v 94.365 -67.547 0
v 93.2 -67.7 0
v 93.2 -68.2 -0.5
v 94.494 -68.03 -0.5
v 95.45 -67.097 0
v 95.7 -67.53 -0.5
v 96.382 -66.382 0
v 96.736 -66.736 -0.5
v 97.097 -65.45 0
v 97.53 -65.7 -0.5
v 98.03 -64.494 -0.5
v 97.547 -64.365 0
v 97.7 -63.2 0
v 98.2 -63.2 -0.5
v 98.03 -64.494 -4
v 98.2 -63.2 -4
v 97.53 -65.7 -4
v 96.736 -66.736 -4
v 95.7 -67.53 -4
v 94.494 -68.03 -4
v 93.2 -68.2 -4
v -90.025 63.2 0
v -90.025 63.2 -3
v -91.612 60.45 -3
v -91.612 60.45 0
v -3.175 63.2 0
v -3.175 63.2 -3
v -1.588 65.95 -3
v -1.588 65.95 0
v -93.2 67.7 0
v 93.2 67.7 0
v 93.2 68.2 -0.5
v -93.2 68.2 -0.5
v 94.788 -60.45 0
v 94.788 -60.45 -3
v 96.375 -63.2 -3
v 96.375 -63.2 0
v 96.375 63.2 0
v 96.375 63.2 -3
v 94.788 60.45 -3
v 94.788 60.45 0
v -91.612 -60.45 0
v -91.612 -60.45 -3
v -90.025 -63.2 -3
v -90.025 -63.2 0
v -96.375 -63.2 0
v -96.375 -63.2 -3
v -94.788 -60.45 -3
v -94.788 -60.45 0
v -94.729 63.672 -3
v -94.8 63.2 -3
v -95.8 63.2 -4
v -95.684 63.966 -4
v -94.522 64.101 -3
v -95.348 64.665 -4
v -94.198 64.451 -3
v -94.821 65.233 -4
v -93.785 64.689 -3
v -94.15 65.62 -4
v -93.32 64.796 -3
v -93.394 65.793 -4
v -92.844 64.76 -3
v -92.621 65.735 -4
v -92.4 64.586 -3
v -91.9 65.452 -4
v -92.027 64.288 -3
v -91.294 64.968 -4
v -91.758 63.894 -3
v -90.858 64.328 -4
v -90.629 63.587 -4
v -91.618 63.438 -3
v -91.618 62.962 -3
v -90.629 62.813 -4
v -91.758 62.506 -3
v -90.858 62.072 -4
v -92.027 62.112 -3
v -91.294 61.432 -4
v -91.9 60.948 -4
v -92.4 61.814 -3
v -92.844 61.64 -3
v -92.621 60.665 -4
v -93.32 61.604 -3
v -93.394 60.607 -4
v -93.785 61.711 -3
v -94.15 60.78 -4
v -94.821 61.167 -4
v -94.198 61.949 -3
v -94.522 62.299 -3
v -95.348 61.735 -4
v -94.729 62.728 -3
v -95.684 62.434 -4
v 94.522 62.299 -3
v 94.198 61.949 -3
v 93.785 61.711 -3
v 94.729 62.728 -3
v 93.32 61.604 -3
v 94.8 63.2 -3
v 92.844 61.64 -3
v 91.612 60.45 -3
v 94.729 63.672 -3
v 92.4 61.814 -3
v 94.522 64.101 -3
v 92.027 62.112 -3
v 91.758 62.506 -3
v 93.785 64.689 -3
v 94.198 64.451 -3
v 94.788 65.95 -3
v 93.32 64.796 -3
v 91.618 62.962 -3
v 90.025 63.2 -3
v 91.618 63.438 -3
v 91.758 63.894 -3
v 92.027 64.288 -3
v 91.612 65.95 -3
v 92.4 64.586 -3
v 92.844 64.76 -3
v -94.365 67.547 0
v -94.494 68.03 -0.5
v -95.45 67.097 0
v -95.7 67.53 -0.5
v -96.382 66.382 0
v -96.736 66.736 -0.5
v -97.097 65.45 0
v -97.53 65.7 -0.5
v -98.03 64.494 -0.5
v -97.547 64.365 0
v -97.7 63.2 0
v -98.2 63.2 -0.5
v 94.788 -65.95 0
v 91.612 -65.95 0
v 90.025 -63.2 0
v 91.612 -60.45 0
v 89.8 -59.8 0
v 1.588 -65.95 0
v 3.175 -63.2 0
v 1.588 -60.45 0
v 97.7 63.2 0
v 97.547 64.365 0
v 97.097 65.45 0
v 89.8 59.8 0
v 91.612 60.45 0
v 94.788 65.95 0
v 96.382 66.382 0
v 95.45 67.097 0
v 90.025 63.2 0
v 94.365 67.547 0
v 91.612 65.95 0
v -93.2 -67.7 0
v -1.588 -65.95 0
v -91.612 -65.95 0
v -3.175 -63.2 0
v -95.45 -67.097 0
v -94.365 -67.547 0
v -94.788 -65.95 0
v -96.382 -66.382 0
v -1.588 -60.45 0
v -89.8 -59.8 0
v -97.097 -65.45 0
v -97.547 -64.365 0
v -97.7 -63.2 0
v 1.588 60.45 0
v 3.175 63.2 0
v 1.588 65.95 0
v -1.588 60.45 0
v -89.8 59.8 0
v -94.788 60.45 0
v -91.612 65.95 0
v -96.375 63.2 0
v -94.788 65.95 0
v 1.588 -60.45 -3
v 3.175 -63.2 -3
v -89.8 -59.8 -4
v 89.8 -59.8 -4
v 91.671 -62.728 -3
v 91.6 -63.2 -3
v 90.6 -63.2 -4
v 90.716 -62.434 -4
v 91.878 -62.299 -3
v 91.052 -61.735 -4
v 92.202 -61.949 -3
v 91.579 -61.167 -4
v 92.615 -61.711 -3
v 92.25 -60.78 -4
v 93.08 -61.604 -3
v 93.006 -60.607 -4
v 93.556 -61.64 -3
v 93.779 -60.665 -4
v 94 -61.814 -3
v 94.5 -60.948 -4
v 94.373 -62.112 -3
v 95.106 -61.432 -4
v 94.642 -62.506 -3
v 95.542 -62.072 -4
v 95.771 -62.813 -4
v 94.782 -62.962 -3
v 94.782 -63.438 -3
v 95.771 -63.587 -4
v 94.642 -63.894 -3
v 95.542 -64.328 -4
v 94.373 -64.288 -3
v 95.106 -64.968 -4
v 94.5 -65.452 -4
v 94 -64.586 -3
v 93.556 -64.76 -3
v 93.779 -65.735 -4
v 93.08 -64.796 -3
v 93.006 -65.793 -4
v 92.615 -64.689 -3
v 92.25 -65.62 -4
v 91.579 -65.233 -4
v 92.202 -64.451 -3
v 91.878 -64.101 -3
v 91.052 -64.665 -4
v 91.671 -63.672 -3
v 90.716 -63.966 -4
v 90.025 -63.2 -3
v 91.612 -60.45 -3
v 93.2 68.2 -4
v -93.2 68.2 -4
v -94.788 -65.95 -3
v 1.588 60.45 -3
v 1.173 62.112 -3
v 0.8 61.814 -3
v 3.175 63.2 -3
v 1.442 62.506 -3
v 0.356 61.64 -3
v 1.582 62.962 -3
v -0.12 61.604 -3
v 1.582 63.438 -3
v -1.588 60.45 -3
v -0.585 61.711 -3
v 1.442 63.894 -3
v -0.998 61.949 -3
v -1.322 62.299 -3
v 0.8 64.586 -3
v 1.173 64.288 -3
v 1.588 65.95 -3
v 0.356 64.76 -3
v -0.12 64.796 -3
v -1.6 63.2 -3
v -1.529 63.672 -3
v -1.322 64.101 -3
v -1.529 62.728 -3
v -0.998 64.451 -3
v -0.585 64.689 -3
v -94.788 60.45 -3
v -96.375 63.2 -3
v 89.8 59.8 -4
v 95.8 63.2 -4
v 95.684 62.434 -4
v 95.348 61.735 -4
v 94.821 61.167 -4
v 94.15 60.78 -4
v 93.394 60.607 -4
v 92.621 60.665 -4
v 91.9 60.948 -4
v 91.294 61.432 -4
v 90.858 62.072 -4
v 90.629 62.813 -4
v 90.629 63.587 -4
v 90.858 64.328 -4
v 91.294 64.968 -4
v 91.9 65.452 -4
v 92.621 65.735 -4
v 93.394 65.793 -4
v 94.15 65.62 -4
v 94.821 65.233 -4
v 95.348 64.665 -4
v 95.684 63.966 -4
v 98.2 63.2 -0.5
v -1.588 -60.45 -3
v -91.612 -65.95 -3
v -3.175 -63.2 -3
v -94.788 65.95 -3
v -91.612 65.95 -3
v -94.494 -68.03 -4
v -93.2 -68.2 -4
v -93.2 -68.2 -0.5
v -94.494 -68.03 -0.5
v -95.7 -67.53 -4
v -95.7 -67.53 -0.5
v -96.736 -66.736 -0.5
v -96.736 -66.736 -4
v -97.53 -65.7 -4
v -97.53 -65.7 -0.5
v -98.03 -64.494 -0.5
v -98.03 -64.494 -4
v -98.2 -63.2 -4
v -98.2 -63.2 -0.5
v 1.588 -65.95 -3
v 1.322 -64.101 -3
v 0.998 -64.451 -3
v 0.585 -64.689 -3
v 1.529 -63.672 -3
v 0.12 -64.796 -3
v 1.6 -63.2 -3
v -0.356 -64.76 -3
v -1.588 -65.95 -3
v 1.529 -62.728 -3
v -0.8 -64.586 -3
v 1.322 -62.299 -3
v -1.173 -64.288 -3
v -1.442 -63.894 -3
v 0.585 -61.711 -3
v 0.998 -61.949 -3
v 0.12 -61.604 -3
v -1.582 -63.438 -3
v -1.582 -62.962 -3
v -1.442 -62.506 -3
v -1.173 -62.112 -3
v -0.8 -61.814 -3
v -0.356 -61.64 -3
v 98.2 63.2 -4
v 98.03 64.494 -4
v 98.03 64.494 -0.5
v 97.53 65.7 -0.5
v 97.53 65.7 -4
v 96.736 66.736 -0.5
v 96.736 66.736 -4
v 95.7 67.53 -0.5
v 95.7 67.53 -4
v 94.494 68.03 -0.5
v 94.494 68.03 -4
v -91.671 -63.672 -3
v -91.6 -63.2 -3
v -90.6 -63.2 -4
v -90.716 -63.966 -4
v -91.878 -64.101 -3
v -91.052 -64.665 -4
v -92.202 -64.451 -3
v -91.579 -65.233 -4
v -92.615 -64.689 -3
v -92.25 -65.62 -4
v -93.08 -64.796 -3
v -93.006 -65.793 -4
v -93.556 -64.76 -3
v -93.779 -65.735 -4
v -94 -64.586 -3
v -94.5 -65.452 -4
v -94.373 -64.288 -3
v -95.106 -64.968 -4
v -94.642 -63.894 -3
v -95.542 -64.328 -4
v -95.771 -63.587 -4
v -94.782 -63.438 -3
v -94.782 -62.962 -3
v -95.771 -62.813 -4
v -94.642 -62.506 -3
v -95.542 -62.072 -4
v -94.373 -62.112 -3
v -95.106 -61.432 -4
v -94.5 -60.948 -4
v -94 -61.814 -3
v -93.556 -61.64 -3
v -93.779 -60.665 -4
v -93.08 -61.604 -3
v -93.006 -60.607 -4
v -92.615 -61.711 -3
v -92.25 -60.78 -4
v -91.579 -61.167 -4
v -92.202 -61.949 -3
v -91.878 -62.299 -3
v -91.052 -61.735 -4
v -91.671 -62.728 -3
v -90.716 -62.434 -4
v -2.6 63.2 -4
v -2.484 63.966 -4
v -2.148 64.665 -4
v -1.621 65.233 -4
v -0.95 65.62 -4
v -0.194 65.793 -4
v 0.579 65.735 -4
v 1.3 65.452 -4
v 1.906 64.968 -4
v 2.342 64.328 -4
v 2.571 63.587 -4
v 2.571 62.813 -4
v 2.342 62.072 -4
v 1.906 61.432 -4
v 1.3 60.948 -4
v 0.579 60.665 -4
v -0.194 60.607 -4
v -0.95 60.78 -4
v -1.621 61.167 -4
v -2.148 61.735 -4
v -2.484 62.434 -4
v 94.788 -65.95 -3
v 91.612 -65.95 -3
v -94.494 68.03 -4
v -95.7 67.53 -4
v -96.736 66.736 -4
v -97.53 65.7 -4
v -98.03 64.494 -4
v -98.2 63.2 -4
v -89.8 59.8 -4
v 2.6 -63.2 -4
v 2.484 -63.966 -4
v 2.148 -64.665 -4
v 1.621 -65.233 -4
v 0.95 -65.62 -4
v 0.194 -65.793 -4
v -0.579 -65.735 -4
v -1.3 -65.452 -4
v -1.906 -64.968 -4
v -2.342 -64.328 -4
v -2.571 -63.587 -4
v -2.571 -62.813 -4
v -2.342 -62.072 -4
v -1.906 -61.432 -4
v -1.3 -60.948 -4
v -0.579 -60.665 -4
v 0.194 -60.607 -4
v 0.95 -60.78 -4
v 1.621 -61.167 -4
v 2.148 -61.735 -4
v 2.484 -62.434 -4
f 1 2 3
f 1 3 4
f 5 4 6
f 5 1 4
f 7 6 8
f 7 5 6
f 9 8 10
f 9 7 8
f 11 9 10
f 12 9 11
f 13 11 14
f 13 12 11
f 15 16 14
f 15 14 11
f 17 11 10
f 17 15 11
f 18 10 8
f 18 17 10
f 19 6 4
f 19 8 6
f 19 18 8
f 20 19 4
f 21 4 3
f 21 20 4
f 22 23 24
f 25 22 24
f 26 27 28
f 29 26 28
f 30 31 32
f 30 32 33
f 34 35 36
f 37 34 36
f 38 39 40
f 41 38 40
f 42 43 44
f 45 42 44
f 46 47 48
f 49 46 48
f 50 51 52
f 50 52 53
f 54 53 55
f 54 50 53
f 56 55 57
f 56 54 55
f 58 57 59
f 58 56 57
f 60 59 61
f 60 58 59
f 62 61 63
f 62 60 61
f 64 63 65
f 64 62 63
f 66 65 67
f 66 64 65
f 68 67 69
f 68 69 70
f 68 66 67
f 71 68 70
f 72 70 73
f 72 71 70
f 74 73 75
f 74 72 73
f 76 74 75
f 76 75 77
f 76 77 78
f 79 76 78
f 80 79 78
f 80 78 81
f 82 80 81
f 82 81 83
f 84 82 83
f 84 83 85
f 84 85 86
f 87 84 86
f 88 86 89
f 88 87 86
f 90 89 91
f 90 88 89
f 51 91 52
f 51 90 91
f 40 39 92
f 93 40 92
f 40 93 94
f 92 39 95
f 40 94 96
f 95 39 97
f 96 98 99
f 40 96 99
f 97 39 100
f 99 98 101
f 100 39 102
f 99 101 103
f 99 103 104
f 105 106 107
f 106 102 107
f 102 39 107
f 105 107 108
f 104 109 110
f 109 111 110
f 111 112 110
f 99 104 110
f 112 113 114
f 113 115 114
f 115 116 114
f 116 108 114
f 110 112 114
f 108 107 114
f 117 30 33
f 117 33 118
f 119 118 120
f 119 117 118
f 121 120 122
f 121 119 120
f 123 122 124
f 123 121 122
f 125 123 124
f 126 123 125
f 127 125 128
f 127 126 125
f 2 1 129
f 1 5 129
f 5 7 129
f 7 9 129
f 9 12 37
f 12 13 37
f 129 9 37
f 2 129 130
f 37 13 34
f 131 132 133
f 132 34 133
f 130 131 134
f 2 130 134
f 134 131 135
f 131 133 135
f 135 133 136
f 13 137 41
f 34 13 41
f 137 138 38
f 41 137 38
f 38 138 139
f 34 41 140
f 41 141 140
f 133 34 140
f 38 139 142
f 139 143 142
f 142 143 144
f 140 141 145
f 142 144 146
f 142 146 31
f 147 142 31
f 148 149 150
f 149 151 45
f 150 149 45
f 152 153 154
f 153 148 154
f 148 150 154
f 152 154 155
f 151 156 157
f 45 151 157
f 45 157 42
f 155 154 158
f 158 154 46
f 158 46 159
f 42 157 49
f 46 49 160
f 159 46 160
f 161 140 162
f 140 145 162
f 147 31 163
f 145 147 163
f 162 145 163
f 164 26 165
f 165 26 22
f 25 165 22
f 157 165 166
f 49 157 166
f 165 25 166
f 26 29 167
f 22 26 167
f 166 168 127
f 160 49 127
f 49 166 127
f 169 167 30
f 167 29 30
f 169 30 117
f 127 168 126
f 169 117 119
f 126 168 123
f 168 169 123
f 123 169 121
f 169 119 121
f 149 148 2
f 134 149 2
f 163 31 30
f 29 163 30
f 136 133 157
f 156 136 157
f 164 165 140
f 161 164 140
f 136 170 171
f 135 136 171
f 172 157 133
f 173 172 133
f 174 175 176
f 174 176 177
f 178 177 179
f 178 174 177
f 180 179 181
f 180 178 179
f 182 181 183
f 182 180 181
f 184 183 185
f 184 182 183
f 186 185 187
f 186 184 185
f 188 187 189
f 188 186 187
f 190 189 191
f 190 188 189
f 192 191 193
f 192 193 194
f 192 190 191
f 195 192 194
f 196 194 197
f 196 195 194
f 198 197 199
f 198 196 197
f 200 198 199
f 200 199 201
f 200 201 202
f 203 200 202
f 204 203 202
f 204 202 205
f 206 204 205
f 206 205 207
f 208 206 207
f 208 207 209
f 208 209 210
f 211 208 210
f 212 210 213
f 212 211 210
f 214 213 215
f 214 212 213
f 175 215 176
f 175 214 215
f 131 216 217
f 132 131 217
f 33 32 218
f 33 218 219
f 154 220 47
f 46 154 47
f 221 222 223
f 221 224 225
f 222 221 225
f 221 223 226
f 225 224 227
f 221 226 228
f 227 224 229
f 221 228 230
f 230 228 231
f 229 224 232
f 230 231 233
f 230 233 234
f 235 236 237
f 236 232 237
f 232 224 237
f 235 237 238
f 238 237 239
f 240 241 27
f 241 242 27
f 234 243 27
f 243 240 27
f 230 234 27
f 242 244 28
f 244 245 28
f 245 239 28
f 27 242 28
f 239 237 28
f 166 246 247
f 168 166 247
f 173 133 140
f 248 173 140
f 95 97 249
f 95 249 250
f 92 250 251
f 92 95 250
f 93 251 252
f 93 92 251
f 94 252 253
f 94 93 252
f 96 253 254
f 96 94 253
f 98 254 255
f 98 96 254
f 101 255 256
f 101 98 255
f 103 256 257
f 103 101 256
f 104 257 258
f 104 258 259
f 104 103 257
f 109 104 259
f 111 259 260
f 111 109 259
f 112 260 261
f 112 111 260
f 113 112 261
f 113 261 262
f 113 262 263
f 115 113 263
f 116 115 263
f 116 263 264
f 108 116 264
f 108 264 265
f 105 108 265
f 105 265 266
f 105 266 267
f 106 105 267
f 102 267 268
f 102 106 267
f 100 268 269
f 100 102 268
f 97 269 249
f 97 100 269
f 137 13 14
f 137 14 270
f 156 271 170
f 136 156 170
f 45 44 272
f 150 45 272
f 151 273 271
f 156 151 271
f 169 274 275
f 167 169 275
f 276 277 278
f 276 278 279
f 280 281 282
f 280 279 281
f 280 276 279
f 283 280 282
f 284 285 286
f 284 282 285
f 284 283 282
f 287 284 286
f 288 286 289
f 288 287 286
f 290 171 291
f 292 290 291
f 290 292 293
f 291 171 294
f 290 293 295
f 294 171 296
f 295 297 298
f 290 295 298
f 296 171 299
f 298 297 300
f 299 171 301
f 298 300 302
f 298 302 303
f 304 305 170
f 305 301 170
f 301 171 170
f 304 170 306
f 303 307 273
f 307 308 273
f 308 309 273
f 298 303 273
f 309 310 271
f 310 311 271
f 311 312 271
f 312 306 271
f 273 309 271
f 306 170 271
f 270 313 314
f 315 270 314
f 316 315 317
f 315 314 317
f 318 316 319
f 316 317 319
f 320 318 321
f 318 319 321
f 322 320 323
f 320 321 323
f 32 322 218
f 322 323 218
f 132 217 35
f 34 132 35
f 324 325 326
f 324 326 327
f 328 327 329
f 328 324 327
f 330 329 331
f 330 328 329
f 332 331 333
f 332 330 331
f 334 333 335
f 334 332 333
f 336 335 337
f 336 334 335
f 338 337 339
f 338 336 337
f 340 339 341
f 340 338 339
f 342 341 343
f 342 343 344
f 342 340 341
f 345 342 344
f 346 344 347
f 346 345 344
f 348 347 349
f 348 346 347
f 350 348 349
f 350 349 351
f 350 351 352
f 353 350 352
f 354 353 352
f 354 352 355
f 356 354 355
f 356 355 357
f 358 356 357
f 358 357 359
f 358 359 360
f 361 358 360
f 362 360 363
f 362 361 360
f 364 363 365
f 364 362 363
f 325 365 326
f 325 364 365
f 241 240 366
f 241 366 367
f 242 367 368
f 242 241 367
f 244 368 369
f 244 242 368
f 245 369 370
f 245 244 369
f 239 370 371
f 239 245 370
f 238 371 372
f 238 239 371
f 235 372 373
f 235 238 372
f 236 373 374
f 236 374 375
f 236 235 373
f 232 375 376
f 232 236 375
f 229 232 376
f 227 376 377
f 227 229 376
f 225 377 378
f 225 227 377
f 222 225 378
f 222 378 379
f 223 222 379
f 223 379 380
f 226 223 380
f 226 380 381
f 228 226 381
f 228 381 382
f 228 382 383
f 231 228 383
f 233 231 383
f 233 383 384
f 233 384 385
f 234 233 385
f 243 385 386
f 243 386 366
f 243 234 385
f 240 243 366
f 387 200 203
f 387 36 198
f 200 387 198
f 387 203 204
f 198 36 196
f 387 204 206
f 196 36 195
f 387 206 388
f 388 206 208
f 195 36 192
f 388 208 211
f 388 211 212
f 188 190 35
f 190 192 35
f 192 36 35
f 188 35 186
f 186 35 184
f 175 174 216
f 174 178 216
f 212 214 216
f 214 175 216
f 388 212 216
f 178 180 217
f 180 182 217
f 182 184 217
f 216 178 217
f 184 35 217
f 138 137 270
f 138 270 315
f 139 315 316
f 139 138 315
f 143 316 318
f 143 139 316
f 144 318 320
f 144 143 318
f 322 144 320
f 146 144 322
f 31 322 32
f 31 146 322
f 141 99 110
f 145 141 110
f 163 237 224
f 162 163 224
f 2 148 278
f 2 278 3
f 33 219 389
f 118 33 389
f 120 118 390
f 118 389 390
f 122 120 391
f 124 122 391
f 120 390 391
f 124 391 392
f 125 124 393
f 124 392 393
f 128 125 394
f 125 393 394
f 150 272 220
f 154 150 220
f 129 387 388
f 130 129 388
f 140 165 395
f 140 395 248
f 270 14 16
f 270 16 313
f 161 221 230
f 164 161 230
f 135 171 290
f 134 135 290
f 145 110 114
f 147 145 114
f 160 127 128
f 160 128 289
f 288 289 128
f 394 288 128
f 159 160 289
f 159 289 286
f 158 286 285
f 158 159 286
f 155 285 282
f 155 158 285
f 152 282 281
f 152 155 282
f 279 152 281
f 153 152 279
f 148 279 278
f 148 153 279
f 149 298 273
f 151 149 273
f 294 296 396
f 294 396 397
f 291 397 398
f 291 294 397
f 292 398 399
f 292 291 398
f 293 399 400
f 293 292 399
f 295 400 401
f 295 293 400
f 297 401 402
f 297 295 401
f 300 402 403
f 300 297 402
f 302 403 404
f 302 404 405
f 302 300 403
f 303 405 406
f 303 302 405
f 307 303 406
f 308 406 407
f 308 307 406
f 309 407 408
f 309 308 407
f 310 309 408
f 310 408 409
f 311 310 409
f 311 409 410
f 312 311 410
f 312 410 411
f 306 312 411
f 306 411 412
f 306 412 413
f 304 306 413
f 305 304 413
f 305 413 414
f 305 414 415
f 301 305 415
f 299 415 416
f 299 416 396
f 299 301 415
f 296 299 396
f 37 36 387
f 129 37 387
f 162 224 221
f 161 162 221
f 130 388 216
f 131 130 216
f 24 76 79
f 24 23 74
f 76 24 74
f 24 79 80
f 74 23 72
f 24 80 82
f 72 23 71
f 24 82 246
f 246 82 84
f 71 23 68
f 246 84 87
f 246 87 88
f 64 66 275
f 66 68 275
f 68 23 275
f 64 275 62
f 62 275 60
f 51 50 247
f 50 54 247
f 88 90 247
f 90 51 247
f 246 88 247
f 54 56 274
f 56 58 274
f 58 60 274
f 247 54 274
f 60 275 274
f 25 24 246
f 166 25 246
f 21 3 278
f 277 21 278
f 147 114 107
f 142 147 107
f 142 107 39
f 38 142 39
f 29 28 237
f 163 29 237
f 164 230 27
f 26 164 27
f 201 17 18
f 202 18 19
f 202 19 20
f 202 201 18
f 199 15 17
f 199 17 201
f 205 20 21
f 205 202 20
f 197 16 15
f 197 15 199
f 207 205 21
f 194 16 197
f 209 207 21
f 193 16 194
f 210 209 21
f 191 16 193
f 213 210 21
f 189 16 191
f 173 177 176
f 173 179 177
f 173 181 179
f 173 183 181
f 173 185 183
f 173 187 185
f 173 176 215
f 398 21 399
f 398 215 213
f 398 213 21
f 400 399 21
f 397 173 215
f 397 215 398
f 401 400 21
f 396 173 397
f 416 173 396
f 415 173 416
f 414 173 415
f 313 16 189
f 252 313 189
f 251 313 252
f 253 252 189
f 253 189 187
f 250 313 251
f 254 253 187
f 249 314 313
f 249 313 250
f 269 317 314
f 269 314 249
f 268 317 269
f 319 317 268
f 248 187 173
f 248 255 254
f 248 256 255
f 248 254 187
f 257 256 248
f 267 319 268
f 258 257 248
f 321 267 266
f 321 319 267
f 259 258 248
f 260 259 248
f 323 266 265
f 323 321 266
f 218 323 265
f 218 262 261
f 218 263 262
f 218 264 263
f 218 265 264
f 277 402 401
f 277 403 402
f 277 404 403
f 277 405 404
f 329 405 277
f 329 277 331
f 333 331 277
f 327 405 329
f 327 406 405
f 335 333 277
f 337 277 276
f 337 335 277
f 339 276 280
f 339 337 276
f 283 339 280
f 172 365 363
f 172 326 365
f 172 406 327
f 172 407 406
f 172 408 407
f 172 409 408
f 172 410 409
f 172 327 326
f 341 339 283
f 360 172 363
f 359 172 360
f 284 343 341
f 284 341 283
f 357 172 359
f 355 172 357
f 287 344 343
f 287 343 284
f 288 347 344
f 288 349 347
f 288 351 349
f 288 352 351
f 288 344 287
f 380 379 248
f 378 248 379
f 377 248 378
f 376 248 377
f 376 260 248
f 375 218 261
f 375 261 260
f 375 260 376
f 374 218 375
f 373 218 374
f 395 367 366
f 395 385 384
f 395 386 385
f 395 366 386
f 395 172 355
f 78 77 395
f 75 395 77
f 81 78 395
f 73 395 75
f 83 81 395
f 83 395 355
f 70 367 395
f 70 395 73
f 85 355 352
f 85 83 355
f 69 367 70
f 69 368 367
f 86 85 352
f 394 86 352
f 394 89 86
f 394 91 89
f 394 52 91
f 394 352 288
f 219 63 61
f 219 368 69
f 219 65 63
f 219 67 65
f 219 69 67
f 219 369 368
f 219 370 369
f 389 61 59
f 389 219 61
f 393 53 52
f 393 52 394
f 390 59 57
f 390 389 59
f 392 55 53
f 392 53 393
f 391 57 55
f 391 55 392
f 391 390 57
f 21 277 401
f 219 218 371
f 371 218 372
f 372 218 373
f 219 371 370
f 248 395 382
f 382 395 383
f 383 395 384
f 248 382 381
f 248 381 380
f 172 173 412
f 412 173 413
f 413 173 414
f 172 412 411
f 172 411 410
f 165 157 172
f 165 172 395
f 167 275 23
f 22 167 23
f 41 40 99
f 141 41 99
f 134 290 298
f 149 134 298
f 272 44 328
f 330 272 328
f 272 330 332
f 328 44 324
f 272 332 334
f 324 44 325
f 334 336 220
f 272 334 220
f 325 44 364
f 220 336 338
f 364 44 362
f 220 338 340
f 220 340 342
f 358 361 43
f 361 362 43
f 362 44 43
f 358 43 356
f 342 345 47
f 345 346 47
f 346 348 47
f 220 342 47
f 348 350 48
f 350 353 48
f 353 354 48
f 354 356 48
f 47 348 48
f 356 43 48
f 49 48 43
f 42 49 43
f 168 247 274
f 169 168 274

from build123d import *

# Parameters (mm, degrees)
CROQUIS1_W              = 179.6
CROQUIS1_H              = 119.6
CROQUIS1_W_2            = 176.4
CROQUIS1_H_2            = 116.4
SALIENTE_EXTRUIR1_DEPTH = 40
CROQUIS2_W              = 196.4
CROQUIS2_H              = 136.4
CROQUIS2_W_2            = 176.4
CROQUIS2_H_2            = 116.4
SALIENTE_EXTRUIR2_DEPTH = 4
CROQUIS10_W             = 179.6
CROQUIS10_H             = 119.6
CORTAR_EXTRUIR6_DEPTH   = 128.398901094
CROQUIS7_R              = 1.6
CORTAR_EXTRUIR3_DEPTH   = 120.626418487
CORTAR_EXTRUIR5_START   = -1
CORTAR_EXTRUIR5_DEPTH   = 119.626418487
REDONDEO1_R             = 5
CHAFL_N2_SIZE           = 0.5
CHAFL_N3_SIZE           = 1


with BuildPart() as part:
    # Croquis1 → Saliente-Extruir1 (new body)
    with BuildSketch(Plane.XY):
        Rectangle(CROQUIS1_W, CROQUIS1_H)
        Rectangle(CROQUIS1_W_2, CROQUIS1_H_2, mode=Mode.SUBTRACT)
    extrude(amount=SALIENTE_EXTRUIR1_DEPTH)

    # Croquis2 → Saliente-Extruir2 (add)
    with BuildSketch(Plane(origin=(0, 0, 0), x_dir=(-1, 0, 0), z_dir=(0, 0, -1))):
        Rectangle(CROQUIS2_W, CROQUIS2_H)
        Rectangle(CROQUIS2_W_2, CROQUIS2_H_2, mode=Mode.SUBTRACT)
    extrude(amount=SALIENTE_EXTRUIR2_DEPTH)

    # Croquis10 → Cortar-Extruir6 (cut, through all)
    with BuildSketch(Plane.XY.offset(40)):
        Rectangle(CROQUIS10_W, CROQUIS10_H)
    extrude(amount=-CORTAR_EXTRUIR6_DEPTH, mode=Mode.SUBTRACT)

    # Croquis7 → Cortar-Extruir3 (cut, through all)
    with BuildSketch(Plane(origin=(0, 0, -4), x_dir=(-1, 0, 0), z_dir=(0, 0, -1))):
        with Locations((0, 63.2)):
            Circle(CROQUIS7_R)
        with Locations((93.2, 63.2)):
            Circle(CROQUIS7_R)
        with Locations(Location((-93.2, 63.2, 0), (0, 0, 180))):
            Circle(CROQUIS7_R)
        with Locations((-93.2, -63.2)):
            Circle(CROQUIS7_R)
        with Locations(Location((93.2, -63.2, 0), (0, 0, 180))):
            Circle(CROQUIS7_R)
        with Locations(Location((0, -63.2, 0), (0, 0, 180))):
            Circle(CROQUIS7_R)
    extrude(amount=-CORTAR_EXTRUIR3_DEPTH, mode=Mode.SUBTRACT)

    # Croquis9 → Cortar-Extruir5 (cut, through all)
    with BuildSketch(Plane(origin=(0, 0, -4), x_dir=(-1, 0, 0), z_dir=(0, 0, -1)).offset(CORTAR_EXTRUIR5_START)):
        Polygon((-90.024573519, 63.2), (-91.61228676, 65.95), (-94.78771324, 65.95), (-96.375426481, 63.2), (-94.78771324, 60.45), (-91.61228676, 60.45), align=None)
        Polygon((3.175426481, 63.2), (1.58771324, 65.95), (-1.58771324, 65.95), (-3.175426481, 63.2), (-1.58771324, 60.45), (1.58771324, 60.45), align=None)
        Polygon((3.175426481, -63.2), (1.58771324, -60.45), (-1.58771324, -60.45), (-3.175426481, -63.2), (-1.58771324, -65.95), (1.58771324, -65.95), align=None)
        Polygon((-90.024573519, -63.2), (-91.61228676, -60.45), (-94.78771324, -60.45), (-96.375426481, -63.2), (-94.78771324, -65.95), (-91.61228676, -65.95), align=None)
        Polygon((96.375426481, -63.2), (94.78771324, -60.45), (91.61228676, -60.45), (90.024573519, -63.2), (91.61228676, -65.95), (94.78771324, -65.95), align=None)
        Polygon((96.375426481, 63.2), (94.78771324, 65.95), (91.61228676, 65.95), (90.024573519, 63.2), (91.61228676, 60.45), (94.78771324, 60.45), align=None)
    extrude(amount=-CORTAR_EXTRUIR5_DEPTH, mode=Mode.SUBTRACT)

    # Redondeo1
    redondeo1_edges = [part.edges().sort_by_distance(p)[0] for p in [
        (-98.2, -68.2, -2),
        (-98.2, 68.2, -2),
        (98.2, 68.2, -2),
        (98.2, -68.2, -2),
    ]]
    fillet(redondeo1_edges, radius=REDONDEO1_R)

    # Chaflán2
    chafl_n2_edges = [part.edges().sort_by_distance(p)[0] for p in [
        (98.2, 0, 0),
        (-98.2, 0, 0),
        (0, -68.2, 0),
        (0, 68.2, 0),
        (-96.735533906, 66.735533906, 0),
        (-96.735533906, -66.735533906, 0),
        (96.735533906, -66.735533906, 0),
        (96.735533906, 66.735533906, 0),
    ]]
    chamfer(chafl_n2_edges, length=CHAFL_N2_SIZE)

    # Chaflán3
    chafl_n3_edges = [part.edges().sort_by_distance(p)[0] for p in [
        (-91.6, 63.2, -4),
        (91.6, 63.2, -4),
        (94.8, -63.2, -4),
        (-94.8, -63.2, -4),
        (-1.6, -63.2, -4),
        (1.6, 63.2, -4),
    ]]
    chamfer(chafl_n3_edges, length=CHAFL_N3_SIZE - 0.0001)  # a hair under: the kernel refuses the full size


solid = part.part
